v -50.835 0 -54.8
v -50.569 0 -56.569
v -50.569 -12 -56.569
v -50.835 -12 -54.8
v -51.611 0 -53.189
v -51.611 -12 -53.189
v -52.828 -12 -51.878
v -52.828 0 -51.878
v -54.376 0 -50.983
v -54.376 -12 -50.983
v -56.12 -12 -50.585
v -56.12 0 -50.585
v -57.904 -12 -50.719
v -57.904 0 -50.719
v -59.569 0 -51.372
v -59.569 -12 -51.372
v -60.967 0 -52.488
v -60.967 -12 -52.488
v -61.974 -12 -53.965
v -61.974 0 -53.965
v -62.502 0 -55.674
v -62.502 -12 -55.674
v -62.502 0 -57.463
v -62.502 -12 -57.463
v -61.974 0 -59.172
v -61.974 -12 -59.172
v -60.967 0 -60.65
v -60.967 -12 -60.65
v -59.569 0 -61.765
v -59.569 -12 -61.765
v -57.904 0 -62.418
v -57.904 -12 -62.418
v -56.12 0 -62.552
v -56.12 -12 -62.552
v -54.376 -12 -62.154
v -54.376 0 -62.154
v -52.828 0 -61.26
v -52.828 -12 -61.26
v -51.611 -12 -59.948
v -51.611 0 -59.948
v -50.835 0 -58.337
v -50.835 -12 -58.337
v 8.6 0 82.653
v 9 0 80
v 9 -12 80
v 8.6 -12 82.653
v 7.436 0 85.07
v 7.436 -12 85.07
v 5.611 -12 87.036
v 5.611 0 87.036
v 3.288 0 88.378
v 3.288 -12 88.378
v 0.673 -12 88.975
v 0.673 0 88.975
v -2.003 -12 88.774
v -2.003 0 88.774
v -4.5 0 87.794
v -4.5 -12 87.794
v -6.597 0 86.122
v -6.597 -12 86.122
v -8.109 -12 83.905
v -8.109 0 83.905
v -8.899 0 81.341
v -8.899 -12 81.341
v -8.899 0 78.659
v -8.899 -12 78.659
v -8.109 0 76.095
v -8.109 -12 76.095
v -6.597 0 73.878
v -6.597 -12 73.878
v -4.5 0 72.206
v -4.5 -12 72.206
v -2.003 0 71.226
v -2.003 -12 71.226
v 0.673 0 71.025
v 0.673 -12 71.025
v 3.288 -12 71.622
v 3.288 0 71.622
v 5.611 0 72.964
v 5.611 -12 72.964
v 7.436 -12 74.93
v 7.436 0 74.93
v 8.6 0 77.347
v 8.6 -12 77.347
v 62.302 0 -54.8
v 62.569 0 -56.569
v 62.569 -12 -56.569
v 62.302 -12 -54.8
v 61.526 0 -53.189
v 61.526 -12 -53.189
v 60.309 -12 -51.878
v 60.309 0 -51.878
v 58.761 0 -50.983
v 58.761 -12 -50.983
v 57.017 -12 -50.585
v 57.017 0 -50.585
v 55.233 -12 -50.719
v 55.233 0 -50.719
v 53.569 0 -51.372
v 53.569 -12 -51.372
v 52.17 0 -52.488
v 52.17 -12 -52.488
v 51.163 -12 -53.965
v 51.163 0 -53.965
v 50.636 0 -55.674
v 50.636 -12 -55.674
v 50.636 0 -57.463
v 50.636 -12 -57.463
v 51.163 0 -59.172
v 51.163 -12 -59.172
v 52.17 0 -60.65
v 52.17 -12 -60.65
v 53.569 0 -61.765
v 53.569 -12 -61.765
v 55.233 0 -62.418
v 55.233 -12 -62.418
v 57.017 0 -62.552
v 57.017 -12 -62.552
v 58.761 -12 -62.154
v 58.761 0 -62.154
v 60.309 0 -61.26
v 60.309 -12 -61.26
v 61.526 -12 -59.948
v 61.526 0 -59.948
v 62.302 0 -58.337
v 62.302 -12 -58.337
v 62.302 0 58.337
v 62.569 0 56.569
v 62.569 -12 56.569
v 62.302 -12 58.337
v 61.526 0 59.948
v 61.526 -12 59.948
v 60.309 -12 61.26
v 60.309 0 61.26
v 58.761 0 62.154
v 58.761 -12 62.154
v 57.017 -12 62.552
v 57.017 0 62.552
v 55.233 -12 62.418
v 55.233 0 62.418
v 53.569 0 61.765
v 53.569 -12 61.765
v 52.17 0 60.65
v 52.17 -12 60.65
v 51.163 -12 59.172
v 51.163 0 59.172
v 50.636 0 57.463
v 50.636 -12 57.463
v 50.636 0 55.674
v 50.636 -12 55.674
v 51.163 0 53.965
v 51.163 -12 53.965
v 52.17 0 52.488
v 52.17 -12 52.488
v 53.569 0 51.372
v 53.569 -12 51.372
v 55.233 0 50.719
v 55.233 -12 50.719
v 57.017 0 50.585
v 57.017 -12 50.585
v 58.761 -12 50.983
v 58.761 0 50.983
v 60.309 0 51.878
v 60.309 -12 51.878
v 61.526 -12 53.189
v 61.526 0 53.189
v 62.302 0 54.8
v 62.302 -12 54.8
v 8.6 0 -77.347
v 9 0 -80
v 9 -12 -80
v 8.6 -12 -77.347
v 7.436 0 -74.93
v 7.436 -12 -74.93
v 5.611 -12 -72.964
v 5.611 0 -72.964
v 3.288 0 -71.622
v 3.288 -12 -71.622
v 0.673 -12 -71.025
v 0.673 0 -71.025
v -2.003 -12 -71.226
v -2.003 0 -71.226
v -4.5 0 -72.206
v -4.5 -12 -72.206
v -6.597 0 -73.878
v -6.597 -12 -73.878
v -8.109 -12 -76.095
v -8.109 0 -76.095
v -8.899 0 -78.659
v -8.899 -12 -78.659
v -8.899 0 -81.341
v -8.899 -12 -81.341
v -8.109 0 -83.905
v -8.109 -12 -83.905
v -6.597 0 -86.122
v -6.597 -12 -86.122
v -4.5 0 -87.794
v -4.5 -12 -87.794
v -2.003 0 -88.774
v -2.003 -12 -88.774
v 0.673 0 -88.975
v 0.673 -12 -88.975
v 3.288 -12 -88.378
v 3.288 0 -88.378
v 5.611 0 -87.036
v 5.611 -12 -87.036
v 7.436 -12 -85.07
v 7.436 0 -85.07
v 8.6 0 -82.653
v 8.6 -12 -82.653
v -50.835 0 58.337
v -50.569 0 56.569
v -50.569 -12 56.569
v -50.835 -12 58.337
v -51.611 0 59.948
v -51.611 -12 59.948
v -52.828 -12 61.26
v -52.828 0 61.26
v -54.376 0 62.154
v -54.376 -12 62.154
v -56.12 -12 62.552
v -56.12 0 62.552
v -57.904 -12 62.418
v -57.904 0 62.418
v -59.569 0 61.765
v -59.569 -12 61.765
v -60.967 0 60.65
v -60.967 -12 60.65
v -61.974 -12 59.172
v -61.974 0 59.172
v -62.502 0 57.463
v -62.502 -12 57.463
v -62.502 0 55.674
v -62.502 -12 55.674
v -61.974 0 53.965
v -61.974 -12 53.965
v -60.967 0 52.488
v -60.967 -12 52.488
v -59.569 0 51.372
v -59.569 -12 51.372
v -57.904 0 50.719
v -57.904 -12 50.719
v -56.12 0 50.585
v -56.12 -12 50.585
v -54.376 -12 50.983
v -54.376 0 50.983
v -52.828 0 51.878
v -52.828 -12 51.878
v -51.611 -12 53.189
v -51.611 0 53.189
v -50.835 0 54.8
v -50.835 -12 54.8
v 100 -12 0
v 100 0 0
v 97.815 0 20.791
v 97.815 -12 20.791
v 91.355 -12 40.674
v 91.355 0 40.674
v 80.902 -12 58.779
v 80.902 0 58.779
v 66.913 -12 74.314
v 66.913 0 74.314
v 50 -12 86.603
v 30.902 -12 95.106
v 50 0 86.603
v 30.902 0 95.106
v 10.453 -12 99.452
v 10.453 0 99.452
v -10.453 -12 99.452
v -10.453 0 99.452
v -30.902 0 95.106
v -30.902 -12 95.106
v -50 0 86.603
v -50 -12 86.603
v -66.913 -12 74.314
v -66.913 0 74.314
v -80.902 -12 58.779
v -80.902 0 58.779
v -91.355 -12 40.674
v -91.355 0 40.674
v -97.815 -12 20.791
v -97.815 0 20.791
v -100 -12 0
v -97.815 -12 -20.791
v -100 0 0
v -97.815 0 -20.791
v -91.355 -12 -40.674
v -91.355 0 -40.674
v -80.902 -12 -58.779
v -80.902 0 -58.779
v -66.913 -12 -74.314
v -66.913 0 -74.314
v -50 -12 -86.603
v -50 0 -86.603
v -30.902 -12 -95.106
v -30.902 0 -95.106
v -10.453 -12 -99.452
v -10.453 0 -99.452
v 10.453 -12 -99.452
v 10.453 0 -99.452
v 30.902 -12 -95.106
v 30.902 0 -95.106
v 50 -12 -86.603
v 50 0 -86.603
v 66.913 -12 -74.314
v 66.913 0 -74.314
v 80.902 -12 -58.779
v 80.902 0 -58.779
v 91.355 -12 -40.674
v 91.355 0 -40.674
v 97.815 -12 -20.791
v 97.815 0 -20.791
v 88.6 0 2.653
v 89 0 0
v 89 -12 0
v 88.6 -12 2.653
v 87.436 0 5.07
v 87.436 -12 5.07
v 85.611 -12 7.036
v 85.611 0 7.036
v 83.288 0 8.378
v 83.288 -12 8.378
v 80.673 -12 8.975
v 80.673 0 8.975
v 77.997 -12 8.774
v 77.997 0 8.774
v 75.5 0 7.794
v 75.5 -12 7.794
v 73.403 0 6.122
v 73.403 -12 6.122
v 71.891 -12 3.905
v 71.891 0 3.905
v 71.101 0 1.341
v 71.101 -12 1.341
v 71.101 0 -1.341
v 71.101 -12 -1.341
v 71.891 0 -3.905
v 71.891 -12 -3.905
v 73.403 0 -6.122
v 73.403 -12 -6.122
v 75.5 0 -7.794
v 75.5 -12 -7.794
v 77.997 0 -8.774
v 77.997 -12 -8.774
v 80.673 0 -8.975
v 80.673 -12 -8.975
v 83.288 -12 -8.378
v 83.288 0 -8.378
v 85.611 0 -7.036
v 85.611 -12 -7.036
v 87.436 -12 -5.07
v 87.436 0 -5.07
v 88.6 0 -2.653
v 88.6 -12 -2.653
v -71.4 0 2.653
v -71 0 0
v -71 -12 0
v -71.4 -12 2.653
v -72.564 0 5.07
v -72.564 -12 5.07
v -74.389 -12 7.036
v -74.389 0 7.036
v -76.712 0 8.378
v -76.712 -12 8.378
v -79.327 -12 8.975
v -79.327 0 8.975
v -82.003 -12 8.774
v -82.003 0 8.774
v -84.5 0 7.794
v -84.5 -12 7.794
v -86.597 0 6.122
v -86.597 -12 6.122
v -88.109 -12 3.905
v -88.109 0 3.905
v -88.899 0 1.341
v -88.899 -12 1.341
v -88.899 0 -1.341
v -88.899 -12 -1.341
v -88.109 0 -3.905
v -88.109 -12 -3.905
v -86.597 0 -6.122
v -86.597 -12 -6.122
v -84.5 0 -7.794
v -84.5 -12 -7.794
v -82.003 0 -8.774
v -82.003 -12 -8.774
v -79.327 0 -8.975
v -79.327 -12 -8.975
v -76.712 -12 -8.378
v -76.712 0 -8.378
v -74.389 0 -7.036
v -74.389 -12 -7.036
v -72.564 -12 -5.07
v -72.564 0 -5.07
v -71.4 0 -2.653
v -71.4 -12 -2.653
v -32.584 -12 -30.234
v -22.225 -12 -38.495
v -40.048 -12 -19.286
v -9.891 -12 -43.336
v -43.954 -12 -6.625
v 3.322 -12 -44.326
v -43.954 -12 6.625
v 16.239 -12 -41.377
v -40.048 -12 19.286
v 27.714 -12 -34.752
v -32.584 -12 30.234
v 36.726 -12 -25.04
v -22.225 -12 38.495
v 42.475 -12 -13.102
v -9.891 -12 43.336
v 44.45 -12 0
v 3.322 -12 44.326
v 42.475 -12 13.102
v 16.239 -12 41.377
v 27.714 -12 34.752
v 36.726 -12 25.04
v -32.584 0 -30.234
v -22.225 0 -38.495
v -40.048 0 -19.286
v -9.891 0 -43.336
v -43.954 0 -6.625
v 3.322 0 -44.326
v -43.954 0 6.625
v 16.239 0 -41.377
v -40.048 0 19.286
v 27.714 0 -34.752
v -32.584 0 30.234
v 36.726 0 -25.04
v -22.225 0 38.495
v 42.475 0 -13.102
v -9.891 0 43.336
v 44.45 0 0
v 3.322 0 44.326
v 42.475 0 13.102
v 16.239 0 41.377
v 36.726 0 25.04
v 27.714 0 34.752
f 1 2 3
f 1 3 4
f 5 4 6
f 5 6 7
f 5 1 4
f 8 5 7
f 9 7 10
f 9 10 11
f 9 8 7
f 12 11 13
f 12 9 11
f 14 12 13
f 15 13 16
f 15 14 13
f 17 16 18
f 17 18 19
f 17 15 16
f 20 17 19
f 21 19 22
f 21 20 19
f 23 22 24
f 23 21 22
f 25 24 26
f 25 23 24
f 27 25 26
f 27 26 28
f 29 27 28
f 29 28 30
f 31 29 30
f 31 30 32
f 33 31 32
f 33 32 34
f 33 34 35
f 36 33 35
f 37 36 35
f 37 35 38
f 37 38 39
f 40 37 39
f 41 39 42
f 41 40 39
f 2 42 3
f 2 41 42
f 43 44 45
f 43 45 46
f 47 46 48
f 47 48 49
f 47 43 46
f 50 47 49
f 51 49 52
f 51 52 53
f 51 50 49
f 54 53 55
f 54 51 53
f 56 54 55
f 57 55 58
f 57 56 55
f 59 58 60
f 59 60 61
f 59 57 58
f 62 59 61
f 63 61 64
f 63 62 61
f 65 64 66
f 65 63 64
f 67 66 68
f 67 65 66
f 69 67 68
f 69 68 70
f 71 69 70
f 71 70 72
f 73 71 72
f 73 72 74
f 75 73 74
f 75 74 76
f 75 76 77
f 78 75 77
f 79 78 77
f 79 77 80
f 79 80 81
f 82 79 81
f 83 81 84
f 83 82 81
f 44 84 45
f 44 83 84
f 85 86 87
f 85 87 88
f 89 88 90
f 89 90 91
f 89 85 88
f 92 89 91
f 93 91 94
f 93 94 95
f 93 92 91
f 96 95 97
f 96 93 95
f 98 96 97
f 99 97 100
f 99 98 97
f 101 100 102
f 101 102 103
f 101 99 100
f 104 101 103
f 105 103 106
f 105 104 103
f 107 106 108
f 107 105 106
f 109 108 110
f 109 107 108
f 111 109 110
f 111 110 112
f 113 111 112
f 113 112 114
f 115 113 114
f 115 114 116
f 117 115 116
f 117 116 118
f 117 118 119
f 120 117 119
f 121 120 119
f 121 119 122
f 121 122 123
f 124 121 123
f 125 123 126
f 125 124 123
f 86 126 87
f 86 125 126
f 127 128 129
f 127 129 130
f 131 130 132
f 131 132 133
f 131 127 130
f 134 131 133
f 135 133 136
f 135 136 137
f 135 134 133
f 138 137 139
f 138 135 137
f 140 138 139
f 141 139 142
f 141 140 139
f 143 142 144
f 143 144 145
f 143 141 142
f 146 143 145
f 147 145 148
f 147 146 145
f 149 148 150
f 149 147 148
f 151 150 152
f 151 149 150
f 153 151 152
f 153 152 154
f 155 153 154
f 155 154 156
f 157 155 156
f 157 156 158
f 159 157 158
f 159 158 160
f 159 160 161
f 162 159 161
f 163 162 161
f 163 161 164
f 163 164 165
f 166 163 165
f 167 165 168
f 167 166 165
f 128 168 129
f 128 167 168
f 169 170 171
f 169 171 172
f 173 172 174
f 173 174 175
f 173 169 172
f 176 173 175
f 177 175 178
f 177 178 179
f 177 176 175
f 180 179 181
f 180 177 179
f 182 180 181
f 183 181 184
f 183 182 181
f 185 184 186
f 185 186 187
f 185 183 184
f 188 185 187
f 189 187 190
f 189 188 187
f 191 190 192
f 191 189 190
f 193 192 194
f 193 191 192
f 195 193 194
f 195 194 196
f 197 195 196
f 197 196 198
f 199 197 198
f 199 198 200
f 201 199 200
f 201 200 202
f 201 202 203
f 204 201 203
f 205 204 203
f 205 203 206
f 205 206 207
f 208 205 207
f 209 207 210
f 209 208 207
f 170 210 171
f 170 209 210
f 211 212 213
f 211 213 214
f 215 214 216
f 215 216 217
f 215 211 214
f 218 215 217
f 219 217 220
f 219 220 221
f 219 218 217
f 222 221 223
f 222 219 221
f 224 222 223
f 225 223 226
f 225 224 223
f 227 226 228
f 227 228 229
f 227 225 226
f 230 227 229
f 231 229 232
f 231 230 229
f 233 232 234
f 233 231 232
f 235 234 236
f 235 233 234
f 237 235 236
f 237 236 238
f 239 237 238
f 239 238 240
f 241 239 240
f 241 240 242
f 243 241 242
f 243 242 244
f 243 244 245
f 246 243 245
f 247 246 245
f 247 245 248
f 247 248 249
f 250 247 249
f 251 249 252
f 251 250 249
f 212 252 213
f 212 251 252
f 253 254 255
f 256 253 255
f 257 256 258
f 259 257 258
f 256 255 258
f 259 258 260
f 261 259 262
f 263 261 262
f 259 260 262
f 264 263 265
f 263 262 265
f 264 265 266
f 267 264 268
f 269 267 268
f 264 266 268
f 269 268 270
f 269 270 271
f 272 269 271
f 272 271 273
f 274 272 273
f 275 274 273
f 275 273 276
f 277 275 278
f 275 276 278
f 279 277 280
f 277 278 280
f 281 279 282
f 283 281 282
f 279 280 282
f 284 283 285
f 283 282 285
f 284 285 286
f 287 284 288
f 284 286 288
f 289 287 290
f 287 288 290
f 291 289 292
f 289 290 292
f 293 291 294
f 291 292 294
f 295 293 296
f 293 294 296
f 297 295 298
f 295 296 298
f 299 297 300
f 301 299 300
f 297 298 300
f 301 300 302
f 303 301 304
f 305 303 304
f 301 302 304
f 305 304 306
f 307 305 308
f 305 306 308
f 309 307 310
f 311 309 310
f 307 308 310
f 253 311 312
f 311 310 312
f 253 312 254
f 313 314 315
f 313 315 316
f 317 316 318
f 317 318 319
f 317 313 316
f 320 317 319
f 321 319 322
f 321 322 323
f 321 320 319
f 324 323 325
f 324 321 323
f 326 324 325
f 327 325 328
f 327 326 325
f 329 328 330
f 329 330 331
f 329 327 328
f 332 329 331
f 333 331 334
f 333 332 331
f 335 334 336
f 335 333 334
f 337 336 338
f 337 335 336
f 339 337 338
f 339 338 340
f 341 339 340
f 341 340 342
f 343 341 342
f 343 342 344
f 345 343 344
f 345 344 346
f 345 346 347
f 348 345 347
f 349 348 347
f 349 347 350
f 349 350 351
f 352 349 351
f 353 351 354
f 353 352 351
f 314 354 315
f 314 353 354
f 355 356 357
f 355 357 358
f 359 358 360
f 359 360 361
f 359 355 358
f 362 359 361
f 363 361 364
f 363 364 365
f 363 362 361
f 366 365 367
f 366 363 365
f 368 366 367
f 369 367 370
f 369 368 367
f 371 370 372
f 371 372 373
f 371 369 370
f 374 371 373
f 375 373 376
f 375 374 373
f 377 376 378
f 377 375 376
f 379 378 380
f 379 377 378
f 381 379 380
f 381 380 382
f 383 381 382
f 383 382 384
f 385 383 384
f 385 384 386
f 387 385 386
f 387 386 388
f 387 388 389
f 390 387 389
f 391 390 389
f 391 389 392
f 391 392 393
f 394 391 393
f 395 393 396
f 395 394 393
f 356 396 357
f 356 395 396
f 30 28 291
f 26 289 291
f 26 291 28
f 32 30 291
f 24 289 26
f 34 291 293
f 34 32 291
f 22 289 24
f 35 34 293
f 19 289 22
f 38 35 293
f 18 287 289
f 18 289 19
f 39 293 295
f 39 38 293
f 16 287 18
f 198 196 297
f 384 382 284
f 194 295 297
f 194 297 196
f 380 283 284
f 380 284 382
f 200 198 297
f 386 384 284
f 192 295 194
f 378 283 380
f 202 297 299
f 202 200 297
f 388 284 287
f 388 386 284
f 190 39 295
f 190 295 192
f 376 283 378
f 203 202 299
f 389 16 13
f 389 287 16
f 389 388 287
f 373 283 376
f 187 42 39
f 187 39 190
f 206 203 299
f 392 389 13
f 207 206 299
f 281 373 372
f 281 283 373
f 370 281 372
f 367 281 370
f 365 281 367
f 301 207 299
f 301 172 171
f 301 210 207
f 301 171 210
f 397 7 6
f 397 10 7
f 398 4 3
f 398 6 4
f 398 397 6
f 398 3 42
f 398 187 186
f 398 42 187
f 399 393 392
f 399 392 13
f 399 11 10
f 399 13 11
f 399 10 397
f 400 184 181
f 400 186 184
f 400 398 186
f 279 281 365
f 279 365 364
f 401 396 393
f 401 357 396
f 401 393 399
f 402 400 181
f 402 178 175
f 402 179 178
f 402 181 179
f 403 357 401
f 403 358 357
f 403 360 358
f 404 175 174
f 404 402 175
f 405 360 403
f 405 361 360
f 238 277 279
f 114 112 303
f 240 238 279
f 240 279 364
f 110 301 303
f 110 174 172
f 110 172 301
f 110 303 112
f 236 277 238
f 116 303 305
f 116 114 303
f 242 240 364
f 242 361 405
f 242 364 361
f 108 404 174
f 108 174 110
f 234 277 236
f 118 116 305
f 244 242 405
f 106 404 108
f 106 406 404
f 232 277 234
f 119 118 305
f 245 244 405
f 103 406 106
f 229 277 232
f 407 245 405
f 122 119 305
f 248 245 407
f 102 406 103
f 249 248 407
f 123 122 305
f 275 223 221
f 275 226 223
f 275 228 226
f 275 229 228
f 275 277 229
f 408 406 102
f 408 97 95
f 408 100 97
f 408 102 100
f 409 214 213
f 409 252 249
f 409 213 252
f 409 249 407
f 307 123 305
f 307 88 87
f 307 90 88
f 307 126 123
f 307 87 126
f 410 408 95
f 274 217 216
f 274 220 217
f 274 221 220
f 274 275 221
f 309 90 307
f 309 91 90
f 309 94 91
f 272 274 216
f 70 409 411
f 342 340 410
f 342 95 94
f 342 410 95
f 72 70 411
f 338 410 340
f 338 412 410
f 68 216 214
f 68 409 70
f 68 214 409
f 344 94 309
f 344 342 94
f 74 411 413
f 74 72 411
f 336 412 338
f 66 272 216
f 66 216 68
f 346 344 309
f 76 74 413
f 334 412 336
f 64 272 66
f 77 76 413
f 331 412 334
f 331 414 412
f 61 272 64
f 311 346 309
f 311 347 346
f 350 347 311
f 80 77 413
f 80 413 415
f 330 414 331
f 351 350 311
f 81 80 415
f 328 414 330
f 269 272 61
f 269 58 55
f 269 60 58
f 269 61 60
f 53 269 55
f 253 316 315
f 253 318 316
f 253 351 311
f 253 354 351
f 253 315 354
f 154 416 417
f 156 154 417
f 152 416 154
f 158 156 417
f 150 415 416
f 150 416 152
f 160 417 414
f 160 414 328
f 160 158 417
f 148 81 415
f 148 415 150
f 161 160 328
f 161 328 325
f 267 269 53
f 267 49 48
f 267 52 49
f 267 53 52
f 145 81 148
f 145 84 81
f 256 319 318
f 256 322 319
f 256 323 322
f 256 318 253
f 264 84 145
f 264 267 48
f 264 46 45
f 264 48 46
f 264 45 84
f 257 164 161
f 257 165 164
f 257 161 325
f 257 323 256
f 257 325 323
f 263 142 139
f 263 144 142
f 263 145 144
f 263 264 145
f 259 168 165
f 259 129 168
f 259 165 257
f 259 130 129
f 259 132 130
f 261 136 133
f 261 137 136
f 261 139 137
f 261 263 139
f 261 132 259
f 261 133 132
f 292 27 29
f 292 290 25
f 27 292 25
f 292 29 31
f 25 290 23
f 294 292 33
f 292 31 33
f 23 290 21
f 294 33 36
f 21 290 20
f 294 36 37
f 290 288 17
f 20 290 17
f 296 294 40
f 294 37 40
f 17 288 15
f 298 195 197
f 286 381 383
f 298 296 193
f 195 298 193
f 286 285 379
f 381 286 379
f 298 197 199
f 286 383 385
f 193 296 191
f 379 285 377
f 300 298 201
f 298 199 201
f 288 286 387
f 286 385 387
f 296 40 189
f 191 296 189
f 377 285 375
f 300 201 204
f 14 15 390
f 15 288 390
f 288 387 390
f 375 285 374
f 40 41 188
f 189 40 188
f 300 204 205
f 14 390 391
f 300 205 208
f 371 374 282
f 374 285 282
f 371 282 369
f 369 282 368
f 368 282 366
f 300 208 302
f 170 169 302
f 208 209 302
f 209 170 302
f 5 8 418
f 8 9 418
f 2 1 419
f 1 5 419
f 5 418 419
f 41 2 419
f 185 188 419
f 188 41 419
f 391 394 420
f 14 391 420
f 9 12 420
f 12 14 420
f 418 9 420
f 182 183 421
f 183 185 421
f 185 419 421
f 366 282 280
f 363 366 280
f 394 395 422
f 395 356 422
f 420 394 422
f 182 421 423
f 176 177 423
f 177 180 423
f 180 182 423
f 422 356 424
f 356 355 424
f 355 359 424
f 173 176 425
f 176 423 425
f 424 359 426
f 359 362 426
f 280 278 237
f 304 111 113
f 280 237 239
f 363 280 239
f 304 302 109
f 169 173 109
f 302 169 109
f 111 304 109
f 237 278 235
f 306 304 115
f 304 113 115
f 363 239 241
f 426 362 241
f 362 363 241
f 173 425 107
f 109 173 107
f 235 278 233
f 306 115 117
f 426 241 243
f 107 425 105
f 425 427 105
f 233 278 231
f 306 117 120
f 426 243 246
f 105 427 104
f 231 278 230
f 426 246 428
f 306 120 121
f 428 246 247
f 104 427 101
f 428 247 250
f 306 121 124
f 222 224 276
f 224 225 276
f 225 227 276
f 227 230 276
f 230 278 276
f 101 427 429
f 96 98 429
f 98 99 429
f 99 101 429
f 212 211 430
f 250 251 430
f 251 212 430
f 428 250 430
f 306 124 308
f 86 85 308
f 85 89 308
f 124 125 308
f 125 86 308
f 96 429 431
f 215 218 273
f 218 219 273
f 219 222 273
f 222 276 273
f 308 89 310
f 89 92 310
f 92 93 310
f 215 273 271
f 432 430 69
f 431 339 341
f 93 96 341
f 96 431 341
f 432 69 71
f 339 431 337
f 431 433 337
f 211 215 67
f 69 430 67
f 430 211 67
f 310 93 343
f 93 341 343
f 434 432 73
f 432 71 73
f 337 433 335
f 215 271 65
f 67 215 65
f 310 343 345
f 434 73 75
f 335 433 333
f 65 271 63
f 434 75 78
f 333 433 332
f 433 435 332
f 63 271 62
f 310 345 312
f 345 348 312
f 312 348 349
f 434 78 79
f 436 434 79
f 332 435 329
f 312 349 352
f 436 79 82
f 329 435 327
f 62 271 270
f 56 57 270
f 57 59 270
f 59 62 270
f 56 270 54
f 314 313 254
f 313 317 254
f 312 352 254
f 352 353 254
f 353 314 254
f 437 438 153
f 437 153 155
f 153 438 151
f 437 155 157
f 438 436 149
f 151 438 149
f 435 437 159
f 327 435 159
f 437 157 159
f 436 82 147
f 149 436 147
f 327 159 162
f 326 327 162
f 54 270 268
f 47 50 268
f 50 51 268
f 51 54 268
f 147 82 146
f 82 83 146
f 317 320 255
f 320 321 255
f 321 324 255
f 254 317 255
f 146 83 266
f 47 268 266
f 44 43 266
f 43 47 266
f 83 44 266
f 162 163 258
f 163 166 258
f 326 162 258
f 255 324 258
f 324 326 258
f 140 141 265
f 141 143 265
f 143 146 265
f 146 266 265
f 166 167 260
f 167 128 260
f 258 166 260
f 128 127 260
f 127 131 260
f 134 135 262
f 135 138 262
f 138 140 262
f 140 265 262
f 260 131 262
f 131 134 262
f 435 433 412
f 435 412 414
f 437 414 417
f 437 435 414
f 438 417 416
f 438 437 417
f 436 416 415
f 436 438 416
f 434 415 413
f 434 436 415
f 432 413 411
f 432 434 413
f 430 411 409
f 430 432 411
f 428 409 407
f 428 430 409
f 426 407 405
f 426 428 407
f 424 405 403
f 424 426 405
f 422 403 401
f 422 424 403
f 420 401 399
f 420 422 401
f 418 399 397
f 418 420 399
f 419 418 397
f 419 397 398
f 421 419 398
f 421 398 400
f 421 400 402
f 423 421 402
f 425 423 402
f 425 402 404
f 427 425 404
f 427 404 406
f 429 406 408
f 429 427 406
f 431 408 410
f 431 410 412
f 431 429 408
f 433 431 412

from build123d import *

# Parameters (mm, degrees)
F0_R     = 100
F0_R_2   = 6
F0_R_3   = 9
F0_R_4   = 44.45
F1_DEPTH = 12


with BuildPart() as f1:
    # F0 (on Front) → F1 (new body)
    with BuildSketch(Plane.XZ):
        Circle(F0_R)
        with Locations((-56.568542, -56.568542)):
            Circle(F0_R_2, mode=Mode.SUBTRACT)
        with Locations((0, -80)):
            Circle(F0_R_3, mode=Mode.SUBTRACT)
        with Locations((56.568542, -56.568542)):
            Circle(F0_R_2, mode=Mode.SUBTRACT)
        with Locations((-80, 0)):
            Circle(F0_R_3, mode=Mode.SUBTRACT)
        with Locations((-56.568542, 56.568542)):
            Circle(F0_R_2, mode=Mode.SUBTRACT)
        Circle(F0_R_4, mode=Mode.SUBTRACT)
        with Locations((80, 0)):
            Circle(F0_R_3, mode=Mode.SUBTRACT)
        with Locations((0, 80)):
            Circle(F0_R_3, mode=Mode.SUBTRACT)
        with Locations((56.568542, 56.568542)):
            Circle(F0_R_2, mode=Mode.SUBTRACT)
    extrude(amount=F1_DEPTH)


solid = f1.part
